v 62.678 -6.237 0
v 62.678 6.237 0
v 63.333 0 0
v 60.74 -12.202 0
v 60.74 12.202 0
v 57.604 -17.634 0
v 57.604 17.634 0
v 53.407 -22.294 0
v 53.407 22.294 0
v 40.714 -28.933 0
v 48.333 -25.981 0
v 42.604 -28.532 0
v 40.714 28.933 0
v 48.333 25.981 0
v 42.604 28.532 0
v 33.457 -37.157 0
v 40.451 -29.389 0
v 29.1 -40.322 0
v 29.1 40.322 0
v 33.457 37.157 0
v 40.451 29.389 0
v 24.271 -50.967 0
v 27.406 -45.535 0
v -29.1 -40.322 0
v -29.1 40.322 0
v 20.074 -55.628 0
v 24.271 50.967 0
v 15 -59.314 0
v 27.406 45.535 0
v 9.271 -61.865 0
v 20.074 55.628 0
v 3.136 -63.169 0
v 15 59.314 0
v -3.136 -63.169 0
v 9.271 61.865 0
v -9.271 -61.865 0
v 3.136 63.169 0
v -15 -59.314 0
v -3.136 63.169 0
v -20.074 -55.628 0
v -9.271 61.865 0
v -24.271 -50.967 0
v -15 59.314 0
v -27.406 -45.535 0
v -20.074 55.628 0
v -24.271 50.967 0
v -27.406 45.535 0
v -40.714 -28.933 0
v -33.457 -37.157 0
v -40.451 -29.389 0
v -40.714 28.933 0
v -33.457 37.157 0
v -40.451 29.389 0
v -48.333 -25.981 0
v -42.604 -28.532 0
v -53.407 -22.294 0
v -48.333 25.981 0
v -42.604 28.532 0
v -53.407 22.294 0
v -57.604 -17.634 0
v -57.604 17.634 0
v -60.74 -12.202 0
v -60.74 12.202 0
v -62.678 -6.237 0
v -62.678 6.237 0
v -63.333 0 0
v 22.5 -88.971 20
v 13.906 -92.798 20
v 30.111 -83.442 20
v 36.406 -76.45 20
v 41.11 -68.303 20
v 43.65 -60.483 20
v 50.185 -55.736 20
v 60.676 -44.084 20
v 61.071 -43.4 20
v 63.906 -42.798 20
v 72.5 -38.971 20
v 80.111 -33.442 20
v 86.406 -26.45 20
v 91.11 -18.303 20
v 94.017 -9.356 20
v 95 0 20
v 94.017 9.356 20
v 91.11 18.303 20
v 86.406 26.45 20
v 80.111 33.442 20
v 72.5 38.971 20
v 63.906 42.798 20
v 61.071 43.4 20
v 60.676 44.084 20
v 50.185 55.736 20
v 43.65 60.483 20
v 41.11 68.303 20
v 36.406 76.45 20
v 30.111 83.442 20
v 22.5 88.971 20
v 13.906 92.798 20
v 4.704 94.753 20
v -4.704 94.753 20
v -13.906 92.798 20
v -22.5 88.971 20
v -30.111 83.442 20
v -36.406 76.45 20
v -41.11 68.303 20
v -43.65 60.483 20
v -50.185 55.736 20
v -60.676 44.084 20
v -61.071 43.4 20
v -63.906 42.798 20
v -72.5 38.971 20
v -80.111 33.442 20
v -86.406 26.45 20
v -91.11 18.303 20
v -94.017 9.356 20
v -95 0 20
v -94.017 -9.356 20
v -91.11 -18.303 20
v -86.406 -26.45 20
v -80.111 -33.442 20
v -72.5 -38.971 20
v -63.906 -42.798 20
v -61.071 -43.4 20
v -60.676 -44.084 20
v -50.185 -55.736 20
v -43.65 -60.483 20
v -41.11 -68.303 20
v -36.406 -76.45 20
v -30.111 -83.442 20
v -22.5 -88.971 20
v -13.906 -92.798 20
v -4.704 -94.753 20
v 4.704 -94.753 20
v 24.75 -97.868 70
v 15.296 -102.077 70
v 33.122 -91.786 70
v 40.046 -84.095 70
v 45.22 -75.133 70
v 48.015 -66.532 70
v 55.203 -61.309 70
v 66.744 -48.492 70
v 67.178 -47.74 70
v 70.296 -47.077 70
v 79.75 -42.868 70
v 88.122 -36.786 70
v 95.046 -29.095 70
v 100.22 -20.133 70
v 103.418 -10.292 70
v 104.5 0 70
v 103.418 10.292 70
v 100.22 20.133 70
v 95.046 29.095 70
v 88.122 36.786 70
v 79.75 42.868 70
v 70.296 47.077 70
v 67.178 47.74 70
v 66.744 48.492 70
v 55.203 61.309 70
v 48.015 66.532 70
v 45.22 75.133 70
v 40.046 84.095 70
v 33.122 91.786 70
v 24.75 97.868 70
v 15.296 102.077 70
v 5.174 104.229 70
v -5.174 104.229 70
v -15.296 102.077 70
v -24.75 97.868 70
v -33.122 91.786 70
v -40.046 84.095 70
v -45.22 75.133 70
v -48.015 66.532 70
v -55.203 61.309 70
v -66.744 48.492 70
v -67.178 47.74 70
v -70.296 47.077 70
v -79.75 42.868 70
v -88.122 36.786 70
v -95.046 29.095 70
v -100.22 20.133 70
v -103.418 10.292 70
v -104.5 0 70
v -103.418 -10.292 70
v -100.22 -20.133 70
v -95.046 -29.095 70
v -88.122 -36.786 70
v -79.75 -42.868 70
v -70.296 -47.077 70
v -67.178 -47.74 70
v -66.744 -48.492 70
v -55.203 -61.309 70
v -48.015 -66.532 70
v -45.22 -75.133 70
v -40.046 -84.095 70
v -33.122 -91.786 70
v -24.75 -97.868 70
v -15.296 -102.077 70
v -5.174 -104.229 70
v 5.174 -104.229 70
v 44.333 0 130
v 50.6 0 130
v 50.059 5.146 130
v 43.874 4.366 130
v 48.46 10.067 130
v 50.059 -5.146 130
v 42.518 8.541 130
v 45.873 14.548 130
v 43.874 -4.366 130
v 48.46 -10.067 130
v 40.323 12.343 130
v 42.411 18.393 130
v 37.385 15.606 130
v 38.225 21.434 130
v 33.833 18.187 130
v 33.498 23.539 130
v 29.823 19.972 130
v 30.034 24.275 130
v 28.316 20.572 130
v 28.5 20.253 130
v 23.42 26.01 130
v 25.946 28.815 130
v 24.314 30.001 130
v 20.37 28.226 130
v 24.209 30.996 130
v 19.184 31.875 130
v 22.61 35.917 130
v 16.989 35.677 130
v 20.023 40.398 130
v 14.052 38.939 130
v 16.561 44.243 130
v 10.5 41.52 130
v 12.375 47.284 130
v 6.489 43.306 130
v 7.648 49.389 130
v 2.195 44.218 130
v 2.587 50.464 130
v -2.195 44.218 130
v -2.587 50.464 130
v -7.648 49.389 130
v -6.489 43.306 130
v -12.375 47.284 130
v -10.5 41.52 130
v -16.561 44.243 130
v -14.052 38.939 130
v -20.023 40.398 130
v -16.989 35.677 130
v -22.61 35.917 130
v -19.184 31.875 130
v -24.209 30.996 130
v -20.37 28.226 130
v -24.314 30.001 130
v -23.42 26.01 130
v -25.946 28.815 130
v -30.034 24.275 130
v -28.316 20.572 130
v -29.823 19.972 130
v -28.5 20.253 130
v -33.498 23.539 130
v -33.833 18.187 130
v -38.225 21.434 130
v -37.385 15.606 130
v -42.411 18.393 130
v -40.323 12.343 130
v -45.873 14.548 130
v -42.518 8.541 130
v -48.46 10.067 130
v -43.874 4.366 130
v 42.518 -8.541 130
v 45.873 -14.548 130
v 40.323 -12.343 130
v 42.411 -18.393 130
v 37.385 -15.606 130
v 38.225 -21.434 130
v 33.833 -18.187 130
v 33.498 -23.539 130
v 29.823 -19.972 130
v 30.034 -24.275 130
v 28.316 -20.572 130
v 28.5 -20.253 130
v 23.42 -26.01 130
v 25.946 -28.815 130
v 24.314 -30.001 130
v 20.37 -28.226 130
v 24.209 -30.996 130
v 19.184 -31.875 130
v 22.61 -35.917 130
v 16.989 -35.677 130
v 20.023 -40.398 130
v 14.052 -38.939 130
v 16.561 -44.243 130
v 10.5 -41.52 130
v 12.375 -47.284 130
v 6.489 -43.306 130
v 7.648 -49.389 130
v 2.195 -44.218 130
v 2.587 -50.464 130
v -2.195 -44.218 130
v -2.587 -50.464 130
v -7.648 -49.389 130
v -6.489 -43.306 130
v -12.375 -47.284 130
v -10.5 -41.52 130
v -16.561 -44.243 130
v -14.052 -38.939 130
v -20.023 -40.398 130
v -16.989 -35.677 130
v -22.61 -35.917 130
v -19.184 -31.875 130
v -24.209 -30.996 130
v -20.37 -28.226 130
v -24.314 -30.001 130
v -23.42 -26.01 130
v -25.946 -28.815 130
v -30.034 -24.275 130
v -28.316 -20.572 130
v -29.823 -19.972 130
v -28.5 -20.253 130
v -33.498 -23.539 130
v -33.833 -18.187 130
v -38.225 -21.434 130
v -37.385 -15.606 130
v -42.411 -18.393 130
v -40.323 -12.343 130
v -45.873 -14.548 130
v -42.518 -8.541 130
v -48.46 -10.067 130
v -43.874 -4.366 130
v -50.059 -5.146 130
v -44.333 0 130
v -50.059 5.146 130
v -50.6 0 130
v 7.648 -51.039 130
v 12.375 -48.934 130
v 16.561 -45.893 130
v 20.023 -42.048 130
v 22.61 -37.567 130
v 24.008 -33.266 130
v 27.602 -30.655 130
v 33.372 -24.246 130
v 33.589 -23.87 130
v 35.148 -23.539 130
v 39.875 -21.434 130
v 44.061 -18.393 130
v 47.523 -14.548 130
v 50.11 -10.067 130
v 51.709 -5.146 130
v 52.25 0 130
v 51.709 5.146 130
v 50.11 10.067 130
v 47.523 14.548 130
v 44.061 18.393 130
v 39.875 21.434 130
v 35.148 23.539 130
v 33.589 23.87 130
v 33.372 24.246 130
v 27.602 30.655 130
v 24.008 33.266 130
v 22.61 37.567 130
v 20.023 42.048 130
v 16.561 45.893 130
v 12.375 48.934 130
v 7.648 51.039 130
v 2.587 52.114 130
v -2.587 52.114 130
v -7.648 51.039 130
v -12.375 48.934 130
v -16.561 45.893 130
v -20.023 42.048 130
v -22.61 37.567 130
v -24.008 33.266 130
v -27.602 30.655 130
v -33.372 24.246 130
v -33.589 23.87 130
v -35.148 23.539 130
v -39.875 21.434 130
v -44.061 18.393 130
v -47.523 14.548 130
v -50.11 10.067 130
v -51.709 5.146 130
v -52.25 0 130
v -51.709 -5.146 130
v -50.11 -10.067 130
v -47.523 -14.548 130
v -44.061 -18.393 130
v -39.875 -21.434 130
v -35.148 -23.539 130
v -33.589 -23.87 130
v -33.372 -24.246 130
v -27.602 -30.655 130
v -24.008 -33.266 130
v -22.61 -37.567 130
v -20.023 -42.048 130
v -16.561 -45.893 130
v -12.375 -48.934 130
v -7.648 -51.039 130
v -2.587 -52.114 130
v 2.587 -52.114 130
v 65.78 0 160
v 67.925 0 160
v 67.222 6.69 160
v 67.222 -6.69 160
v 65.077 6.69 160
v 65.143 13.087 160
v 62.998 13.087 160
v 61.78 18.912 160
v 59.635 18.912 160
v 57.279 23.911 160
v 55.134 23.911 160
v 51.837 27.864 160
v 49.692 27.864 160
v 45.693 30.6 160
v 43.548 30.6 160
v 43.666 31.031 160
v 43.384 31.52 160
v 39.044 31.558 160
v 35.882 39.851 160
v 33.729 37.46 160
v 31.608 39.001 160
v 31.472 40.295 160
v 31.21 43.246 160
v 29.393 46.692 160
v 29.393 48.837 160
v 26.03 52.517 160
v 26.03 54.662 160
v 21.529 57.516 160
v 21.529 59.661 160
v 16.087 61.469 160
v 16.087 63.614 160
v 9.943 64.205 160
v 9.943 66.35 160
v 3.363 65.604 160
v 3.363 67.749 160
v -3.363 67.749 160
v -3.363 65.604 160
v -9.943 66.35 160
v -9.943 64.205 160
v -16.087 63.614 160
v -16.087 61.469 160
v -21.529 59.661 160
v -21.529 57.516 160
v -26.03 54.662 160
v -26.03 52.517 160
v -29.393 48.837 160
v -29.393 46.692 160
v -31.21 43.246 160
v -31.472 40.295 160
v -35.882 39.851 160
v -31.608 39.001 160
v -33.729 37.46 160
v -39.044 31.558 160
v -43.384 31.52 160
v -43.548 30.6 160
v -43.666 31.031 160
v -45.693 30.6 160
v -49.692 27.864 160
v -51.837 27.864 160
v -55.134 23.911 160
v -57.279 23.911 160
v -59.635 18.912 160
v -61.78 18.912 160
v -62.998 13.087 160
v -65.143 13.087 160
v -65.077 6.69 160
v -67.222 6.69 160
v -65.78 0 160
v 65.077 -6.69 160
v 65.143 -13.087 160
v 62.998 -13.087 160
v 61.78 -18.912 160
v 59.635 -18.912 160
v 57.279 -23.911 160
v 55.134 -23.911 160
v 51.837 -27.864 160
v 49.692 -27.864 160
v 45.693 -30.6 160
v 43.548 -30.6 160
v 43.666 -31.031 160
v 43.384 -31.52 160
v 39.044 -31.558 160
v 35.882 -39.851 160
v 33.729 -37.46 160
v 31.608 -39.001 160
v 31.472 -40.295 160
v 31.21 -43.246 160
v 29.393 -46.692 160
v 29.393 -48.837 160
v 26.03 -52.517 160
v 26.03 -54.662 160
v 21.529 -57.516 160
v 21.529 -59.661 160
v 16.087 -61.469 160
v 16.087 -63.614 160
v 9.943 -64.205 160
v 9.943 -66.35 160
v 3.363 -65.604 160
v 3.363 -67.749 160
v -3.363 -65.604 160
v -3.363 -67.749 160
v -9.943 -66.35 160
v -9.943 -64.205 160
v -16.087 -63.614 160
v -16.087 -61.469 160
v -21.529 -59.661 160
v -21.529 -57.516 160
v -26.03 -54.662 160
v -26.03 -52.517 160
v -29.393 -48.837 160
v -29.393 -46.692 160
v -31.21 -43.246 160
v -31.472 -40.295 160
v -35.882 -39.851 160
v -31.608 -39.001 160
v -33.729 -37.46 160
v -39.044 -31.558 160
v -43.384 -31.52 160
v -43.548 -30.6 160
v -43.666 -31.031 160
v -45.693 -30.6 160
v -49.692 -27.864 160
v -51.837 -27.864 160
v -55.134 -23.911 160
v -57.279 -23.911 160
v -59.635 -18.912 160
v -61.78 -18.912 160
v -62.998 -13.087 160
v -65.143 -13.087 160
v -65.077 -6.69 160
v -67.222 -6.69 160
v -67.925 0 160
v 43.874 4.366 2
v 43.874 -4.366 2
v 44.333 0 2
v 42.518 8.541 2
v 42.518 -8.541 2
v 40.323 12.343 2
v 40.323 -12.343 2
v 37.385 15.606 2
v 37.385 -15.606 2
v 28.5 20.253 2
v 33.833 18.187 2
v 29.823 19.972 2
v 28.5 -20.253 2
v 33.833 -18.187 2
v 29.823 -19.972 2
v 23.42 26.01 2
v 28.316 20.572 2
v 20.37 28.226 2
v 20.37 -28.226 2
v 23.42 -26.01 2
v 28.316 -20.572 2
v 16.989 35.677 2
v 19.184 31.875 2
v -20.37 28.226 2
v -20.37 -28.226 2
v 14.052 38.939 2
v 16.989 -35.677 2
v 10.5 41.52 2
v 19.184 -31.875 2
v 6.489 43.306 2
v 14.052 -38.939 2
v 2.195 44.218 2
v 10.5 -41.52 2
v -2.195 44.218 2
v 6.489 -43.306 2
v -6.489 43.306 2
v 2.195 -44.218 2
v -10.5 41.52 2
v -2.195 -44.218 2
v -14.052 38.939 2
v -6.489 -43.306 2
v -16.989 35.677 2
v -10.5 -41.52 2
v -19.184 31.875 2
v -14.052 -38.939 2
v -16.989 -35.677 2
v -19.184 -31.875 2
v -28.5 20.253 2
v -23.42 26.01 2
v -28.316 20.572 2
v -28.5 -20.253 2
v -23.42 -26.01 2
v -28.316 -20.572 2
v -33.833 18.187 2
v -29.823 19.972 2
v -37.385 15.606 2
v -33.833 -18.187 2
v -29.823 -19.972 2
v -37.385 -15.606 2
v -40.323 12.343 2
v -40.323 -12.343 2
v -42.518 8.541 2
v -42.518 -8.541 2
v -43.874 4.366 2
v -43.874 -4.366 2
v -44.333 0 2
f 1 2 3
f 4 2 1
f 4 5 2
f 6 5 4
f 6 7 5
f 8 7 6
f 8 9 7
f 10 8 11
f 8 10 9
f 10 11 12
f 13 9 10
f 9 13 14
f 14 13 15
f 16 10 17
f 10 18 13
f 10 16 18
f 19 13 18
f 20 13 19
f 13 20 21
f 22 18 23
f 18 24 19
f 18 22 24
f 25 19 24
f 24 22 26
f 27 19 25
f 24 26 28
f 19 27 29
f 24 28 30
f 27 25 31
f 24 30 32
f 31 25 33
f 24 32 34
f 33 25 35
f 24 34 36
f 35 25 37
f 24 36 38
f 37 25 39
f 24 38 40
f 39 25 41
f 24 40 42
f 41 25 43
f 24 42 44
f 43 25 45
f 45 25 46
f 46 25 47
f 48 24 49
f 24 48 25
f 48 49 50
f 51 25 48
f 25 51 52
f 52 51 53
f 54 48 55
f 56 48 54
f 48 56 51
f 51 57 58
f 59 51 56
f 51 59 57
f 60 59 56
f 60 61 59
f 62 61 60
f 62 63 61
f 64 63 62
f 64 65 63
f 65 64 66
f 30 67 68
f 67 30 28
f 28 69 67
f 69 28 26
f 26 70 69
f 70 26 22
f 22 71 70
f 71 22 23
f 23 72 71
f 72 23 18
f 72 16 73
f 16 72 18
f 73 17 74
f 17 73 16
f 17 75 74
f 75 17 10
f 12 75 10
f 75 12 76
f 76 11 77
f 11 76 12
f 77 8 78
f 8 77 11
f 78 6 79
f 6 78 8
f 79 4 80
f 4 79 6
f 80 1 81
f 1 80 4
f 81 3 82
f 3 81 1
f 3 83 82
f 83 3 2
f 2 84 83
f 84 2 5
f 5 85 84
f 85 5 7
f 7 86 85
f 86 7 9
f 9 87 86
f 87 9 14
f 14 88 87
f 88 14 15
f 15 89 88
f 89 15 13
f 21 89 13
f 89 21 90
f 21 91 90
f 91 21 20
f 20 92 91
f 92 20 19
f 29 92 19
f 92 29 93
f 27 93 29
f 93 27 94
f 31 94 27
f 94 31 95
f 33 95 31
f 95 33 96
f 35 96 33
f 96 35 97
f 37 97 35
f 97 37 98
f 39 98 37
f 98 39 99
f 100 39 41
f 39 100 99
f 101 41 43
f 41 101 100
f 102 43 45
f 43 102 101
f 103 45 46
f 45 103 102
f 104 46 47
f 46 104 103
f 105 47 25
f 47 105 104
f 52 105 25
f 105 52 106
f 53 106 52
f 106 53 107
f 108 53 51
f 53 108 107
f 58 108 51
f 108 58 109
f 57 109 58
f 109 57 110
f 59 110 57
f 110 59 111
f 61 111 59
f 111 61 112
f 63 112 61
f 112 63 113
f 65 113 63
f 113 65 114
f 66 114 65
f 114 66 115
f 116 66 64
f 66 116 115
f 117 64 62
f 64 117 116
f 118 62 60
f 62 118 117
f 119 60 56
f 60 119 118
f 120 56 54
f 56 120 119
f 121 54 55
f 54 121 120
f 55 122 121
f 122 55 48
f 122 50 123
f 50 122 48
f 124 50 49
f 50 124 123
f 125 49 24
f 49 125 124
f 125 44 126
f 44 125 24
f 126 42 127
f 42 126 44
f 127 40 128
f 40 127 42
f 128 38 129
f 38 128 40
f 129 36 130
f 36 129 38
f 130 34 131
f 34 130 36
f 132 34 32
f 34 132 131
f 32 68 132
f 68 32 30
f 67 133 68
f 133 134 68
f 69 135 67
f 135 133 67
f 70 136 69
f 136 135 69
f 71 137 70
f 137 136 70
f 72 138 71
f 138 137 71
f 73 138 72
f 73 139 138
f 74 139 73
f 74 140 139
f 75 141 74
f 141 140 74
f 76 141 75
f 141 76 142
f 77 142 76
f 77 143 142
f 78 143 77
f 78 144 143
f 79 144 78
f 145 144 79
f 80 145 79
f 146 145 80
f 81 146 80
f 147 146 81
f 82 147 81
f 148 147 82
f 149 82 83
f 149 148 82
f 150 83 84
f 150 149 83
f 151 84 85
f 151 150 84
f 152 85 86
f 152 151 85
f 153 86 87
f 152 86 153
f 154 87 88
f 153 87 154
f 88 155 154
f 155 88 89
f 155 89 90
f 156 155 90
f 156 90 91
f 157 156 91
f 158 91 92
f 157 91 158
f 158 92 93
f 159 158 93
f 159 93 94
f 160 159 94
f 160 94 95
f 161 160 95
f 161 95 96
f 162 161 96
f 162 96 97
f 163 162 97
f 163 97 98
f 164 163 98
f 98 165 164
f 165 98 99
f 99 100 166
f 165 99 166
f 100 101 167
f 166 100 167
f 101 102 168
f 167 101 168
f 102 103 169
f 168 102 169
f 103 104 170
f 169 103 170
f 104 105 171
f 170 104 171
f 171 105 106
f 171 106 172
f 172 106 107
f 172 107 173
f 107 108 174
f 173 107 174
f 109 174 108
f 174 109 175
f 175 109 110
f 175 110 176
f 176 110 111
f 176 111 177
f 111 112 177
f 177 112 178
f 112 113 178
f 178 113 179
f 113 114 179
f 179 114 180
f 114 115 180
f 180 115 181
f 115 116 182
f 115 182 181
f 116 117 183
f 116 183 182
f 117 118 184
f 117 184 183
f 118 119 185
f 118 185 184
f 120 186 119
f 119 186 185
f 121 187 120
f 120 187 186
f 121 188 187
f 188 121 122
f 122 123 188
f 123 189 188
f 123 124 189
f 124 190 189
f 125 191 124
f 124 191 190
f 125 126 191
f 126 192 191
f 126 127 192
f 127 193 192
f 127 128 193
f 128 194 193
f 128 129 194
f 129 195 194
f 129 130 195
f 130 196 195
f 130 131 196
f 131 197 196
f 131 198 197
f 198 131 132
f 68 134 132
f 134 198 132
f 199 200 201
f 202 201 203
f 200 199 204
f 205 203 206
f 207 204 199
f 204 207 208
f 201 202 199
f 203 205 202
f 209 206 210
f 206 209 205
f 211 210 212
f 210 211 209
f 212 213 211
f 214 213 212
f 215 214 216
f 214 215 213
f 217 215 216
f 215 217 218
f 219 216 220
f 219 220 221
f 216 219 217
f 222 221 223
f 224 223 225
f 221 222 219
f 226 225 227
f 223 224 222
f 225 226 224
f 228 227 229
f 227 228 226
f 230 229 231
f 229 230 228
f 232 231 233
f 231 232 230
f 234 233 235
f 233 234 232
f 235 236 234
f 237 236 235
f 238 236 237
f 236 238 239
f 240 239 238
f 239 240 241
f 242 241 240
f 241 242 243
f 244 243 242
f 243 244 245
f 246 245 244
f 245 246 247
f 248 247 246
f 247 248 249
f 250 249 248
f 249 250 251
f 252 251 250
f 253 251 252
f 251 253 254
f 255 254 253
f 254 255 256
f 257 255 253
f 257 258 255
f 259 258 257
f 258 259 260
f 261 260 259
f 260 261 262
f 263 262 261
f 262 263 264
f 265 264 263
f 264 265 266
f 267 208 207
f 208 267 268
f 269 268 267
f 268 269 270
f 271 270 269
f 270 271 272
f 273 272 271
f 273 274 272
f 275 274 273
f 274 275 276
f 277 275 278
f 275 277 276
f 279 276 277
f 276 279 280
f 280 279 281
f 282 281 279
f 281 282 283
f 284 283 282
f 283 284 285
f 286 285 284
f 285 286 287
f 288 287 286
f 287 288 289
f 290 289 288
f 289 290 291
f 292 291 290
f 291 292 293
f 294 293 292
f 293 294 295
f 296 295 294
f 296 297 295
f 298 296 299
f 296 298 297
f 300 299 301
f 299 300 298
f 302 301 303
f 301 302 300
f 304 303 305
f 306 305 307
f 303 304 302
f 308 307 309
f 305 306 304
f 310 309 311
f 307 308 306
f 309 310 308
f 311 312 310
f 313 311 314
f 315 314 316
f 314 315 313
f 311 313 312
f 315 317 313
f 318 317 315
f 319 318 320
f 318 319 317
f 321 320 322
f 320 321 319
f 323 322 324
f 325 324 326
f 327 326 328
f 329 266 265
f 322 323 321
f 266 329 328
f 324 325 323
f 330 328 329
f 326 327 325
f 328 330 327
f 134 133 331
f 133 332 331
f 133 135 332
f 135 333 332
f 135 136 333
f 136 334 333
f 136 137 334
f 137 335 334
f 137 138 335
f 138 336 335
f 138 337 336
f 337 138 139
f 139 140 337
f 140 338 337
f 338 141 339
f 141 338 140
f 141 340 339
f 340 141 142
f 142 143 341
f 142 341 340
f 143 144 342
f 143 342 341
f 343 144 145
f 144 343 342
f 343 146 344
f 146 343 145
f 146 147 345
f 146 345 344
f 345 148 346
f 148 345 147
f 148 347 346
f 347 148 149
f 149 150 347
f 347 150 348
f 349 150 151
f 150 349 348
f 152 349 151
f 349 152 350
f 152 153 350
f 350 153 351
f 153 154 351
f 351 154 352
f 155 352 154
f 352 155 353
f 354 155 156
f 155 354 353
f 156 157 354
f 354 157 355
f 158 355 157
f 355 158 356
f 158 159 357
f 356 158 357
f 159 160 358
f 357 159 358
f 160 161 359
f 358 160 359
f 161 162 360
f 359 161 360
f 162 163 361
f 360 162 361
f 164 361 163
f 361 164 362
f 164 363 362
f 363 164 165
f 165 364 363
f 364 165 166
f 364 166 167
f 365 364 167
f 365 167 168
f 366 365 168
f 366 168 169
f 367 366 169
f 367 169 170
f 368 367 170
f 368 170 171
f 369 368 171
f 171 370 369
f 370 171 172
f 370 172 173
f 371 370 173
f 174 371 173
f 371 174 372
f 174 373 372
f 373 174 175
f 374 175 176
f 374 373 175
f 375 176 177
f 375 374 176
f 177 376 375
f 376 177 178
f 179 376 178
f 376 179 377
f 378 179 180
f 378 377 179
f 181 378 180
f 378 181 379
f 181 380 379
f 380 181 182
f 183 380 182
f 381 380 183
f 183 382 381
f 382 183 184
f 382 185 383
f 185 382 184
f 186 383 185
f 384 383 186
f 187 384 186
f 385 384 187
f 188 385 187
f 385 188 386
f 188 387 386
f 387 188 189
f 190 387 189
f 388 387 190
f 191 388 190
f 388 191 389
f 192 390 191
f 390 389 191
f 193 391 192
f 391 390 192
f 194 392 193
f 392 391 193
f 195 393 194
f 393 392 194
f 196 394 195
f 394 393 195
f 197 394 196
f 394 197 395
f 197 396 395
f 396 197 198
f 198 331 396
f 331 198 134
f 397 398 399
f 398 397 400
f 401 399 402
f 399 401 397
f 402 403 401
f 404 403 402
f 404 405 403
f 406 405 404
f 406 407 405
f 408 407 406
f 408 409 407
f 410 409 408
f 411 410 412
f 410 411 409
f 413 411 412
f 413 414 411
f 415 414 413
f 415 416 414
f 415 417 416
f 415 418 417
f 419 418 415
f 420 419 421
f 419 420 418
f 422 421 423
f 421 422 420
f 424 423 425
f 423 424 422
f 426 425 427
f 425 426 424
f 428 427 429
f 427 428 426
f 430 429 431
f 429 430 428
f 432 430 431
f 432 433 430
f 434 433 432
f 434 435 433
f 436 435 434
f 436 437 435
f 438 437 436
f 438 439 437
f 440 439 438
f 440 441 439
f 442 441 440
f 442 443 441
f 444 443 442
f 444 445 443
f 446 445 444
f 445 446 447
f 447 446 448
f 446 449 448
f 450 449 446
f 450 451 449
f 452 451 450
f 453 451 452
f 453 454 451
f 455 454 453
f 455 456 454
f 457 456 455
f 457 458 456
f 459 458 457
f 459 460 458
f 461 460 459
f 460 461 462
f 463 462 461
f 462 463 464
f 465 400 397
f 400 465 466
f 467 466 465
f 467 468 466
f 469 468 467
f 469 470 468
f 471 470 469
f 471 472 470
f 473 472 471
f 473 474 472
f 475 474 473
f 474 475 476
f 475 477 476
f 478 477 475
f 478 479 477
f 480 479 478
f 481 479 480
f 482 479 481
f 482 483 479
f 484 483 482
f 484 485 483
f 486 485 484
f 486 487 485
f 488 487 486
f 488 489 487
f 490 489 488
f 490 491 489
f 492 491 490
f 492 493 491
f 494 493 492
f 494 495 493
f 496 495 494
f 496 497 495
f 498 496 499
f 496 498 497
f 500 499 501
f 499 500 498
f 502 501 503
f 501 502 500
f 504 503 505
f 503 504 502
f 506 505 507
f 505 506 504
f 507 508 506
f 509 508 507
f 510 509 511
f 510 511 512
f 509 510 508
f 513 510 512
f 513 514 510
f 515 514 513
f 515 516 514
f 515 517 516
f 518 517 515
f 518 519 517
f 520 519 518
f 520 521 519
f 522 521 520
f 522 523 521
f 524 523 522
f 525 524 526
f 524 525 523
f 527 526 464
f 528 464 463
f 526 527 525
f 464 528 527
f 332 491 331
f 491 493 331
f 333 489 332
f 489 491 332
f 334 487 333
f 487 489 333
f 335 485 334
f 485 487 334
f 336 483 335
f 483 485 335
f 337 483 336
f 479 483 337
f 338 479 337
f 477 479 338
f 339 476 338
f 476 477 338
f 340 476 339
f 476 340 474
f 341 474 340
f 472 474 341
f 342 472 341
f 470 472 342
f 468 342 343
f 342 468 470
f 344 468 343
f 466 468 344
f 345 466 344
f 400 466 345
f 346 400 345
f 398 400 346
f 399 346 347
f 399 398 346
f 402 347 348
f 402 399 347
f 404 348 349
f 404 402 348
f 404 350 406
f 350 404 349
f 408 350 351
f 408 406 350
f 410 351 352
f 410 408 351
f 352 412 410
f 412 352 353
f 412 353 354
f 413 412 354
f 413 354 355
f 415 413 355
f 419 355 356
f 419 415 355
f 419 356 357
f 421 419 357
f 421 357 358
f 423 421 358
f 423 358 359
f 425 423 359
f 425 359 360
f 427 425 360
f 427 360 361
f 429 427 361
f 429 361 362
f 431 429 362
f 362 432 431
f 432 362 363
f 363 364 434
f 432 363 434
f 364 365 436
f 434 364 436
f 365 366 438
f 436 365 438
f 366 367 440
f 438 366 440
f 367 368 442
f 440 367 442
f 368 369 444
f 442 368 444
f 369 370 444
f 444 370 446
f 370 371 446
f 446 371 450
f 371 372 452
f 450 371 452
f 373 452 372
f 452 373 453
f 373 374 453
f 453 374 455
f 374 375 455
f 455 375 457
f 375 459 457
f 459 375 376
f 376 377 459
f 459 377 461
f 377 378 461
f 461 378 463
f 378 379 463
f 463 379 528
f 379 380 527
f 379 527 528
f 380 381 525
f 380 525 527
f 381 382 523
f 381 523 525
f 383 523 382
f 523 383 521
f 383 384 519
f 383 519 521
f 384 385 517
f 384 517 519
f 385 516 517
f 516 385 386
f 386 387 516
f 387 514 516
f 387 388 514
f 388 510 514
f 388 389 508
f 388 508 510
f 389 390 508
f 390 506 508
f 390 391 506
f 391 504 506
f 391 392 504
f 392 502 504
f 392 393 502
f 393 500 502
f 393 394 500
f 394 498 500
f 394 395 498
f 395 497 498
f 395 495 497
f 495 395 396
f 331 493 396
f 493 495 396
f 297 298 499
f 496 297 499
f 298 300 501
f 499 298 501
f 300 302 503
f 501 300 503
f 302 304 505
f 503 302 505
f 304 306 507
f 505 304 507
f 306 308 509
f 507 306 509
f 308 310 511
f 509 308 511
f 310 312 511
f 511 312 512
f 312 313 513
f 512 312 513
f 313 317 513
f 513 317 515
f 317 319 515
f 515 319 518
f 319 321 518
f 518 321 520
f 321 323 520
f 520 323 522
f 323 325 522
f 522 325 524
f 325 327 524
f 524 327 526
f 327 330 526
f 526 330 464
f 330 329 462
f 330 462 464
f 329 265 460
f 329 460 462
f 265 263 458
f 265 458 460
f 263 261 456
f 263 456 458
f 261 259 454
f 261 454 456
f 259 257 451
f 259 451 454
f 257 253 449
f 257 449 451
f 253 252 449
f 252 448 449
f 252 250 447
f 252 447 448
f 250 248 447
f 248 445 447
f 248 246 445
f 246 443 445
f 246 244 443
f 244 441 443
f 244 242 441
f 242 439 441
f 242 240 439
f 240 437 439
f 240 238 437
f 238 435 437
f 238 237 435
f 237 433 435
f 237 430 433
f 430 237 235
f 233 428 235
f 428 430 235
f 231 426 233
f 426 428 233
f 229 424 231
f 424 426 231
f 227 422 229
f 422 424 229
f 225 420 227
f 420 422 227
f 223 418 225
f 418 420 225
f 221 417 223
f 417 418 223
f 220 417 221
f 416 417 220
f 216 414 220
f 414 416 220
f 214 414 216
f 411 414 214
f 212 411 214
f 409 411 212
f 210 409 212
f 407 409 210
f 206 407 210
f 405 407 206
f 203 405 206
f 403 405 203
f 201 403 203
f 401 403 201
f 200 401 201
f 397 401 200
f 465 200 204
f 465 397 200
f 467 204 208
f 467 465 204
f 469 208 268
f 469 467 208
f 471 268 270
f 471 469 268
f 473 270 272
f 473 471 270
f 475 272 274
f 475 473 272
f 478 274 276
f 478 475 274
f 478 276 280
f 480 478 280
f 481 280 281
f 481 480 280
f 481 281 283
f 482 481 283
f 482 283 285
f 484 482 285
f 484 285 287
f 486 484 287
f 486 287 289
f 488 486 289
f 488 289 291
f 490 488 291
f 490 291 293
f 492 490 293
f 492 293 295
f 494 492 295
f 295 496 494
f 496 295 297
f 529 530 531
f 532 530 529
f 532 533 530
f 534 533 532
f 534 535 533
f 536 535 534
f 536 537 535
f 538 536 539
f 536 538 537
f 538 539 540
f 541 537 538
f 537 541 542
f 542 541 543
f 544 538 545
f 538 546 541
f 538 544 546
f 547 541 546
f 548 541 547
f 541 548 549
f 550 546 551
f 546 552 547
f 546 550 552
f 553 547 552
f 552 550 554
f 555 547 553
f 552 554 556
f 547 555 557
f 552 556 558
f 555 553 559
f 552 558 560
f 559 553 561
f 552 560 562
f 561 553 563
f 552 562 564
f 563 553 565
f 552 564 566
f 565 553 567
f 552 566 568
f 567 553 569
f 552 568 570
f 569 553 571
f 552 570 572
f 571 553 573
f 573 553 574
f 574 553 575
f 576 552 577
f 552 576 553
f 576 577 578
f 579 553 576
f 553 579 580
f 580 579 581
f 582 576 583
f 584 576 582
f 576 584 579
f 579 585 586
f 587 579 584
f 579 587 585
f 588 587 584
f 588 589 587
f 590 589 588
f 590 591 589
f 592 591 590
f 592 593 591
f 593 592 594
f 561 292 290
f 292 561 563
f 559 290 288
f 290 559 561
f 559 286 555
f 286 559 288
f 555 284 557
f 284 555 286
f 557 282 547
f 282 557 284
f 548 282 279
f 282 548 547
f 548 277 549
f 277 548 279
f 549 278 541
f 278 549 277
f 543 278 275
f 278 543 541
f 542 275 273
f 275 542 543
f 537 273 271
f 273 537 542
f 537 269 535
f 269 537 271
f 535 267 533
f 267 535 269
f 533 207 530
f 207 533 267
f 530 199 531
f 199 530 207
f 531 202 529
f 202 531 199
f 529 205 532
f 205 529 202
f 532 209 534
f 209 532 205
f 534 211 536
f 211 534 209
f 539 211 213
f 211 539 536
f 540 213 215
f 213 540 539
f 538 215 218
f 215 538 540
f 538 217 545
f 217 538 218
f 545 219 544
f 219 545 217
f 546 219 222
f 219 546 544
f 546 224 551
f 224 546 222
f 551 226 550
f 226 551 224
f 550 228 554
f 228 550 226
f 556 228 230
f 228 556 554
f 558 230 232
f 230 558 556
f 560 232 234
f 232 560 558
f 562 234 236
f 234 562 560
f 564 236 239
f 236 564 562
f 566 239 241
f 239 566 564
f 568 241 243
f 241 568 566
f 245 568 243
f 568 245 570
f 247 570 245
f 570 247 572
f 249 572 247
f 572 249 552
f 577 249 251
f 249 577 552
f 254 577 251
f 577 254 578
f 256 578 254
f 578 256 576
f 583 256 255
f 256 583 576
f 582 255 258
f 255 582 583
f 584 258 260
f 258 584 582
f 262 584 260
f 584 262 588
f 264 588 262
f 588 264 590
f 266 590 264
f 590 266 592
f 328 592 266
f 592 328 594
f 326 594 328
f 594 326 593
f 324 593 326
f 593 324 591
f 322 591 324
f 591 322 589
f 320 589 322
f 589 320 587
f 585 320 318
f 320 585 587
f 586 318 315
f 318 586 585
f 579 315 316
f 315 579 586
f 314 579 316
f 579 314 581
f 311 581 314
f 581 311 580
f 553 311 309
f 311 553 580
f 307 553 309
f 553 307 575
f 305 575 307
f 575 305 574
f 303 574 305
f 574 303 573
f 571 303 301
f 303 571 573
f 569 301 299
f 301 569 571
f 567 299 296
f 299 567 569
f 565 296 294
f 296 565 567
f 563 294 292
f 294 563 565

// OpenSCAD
diameter=50;

difference(){
    pot(diameter);
    translate([0,0,2]) linear_extrude(height=160) scale([0.7,0.7,0]) wall(diameter,false);
}
module base(diameter){
    circle(diameter);
    translate([diameter*2/3,0,0]) circle(30);
    translate([0,diameter*(2/3),0]) circle(30);
    translate([-(diameter*(2/3)),0,0]) circle(30);
    translate([0,-(diameter*(2/3)),0]) circle(30);
}

module wall(diameter,hollow){
    if(hollow){
        difference(){
            base(diameter);
            base(diameter-3);
        }
    }
    else if(!hollow){
        base(diameter);
    }
}

module pot(diameter){
    linear_extrude(height=2) wall(diameter,false);
    linear_extrude(height=20,scale=1.5) wall(diameter,false);
    translate([0,0,20]) linear_extrude(height=50,scale=1.1) scale([1.5,1.5,0]) wall(diameter,false);
    translate([0,0,70]) linear_extrude(height=60,scale=0.5) scale([1.65,1.65,0]) wall(diameter,false);
    translate([0,0,130]) linear_extrude(height=30,scale=1.3) scale([0.825,0.825,0]) wall(diameter,true);
}
